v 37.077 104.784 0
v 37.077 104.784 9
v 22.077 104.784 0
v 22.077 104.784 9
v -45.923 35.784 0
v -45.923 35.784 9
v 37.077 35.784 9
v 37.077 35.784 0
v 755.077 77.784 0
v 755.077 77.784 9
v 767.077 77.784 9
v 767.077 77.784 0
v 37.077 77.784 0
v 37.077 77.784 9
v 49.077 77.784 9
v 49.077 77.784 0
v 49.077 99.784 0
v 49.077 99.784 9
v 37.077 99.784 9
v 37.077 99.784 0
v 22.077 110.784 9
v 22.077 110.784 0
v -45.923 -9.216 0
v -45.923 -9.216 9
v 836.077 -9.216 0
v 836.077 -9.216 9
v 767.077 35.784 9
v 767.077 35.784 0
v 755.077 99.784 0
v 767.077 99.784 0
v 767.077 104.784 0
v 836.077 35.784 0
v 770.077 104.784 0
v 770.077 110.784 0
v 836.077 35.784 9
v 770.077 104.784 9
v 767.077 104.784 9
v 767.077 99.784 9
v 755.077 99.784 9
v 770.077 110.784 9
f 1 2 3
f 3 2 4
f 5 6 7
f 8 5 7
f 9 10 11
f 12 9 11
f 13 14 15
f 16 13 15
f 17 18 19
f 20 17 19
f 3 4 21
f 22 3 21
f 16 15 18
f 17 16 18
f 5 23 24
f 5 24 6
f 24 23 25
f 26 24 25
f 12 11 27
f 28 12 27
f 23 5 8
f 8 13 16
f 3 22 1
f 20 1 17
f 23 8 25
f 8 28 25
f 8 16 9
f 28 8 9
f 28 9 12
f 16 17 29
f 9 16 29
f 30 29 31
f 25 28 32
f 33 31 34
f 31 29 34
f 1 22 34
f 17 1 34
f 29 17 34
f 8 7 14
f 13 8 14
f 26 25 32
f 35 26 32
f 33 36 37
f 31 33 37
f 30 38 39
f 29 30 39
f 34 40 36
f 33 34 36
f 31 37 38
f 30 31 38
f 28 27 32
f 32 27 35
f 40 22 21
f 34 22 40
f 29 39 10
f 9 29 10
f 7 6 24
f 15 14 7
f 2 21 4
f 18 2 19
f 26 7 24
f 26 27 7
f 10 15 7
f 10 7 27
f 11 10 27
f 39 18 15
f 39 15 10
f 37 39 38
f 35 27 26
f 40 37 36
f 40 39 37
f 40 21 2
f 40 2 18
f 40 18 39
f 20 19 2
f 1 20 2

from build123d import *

# Parameters (mm, degrees)
F0_W     = 882
F0_H     = 120
F1_DEPTH = 9
F3_DEPTH = 9.001


with BuildPart() as f1:
    # F0 (on Top) → F1 (new body)
    with BuildSketch(Plane.XY):
        with Locations((395.077364, 50.783694)):
            Rectangle(F0_W, F0_H)
    extrude(amount=F1_DEPTH)

    # F2 (on face) → F3 (cut, through all)
    with BuildSketch(Plane.XY.offset(9)):
        Polygon((770.077364, 104.783694), (767.077364, 104.783694), (767.077364, 99.783694), (755.077364, 99.783694), (755.077364, 77.783694), (767.077364, 77.783694), (767.077364, 35.783694), (836.077364, 35.783694), (836.077364, 110.783694), (770.077364, 110.783694), align=None)
        Polygon((-45.922636, 35.783694), (37.077364, 35.783694), (37.077364, 77.783694), (49.077364, 77.783694), (49.077364, 99.783694), (37.077364, 99.783694), (37.077364, 104.783694), (22.077364, 104.783694), (22.077364, 110.783694), (-45.922636, 110.783694), align=None)
    extrude(amount=-F3_DEPTH, mode=Mode.SUBTRACT)


solid = f1.part
